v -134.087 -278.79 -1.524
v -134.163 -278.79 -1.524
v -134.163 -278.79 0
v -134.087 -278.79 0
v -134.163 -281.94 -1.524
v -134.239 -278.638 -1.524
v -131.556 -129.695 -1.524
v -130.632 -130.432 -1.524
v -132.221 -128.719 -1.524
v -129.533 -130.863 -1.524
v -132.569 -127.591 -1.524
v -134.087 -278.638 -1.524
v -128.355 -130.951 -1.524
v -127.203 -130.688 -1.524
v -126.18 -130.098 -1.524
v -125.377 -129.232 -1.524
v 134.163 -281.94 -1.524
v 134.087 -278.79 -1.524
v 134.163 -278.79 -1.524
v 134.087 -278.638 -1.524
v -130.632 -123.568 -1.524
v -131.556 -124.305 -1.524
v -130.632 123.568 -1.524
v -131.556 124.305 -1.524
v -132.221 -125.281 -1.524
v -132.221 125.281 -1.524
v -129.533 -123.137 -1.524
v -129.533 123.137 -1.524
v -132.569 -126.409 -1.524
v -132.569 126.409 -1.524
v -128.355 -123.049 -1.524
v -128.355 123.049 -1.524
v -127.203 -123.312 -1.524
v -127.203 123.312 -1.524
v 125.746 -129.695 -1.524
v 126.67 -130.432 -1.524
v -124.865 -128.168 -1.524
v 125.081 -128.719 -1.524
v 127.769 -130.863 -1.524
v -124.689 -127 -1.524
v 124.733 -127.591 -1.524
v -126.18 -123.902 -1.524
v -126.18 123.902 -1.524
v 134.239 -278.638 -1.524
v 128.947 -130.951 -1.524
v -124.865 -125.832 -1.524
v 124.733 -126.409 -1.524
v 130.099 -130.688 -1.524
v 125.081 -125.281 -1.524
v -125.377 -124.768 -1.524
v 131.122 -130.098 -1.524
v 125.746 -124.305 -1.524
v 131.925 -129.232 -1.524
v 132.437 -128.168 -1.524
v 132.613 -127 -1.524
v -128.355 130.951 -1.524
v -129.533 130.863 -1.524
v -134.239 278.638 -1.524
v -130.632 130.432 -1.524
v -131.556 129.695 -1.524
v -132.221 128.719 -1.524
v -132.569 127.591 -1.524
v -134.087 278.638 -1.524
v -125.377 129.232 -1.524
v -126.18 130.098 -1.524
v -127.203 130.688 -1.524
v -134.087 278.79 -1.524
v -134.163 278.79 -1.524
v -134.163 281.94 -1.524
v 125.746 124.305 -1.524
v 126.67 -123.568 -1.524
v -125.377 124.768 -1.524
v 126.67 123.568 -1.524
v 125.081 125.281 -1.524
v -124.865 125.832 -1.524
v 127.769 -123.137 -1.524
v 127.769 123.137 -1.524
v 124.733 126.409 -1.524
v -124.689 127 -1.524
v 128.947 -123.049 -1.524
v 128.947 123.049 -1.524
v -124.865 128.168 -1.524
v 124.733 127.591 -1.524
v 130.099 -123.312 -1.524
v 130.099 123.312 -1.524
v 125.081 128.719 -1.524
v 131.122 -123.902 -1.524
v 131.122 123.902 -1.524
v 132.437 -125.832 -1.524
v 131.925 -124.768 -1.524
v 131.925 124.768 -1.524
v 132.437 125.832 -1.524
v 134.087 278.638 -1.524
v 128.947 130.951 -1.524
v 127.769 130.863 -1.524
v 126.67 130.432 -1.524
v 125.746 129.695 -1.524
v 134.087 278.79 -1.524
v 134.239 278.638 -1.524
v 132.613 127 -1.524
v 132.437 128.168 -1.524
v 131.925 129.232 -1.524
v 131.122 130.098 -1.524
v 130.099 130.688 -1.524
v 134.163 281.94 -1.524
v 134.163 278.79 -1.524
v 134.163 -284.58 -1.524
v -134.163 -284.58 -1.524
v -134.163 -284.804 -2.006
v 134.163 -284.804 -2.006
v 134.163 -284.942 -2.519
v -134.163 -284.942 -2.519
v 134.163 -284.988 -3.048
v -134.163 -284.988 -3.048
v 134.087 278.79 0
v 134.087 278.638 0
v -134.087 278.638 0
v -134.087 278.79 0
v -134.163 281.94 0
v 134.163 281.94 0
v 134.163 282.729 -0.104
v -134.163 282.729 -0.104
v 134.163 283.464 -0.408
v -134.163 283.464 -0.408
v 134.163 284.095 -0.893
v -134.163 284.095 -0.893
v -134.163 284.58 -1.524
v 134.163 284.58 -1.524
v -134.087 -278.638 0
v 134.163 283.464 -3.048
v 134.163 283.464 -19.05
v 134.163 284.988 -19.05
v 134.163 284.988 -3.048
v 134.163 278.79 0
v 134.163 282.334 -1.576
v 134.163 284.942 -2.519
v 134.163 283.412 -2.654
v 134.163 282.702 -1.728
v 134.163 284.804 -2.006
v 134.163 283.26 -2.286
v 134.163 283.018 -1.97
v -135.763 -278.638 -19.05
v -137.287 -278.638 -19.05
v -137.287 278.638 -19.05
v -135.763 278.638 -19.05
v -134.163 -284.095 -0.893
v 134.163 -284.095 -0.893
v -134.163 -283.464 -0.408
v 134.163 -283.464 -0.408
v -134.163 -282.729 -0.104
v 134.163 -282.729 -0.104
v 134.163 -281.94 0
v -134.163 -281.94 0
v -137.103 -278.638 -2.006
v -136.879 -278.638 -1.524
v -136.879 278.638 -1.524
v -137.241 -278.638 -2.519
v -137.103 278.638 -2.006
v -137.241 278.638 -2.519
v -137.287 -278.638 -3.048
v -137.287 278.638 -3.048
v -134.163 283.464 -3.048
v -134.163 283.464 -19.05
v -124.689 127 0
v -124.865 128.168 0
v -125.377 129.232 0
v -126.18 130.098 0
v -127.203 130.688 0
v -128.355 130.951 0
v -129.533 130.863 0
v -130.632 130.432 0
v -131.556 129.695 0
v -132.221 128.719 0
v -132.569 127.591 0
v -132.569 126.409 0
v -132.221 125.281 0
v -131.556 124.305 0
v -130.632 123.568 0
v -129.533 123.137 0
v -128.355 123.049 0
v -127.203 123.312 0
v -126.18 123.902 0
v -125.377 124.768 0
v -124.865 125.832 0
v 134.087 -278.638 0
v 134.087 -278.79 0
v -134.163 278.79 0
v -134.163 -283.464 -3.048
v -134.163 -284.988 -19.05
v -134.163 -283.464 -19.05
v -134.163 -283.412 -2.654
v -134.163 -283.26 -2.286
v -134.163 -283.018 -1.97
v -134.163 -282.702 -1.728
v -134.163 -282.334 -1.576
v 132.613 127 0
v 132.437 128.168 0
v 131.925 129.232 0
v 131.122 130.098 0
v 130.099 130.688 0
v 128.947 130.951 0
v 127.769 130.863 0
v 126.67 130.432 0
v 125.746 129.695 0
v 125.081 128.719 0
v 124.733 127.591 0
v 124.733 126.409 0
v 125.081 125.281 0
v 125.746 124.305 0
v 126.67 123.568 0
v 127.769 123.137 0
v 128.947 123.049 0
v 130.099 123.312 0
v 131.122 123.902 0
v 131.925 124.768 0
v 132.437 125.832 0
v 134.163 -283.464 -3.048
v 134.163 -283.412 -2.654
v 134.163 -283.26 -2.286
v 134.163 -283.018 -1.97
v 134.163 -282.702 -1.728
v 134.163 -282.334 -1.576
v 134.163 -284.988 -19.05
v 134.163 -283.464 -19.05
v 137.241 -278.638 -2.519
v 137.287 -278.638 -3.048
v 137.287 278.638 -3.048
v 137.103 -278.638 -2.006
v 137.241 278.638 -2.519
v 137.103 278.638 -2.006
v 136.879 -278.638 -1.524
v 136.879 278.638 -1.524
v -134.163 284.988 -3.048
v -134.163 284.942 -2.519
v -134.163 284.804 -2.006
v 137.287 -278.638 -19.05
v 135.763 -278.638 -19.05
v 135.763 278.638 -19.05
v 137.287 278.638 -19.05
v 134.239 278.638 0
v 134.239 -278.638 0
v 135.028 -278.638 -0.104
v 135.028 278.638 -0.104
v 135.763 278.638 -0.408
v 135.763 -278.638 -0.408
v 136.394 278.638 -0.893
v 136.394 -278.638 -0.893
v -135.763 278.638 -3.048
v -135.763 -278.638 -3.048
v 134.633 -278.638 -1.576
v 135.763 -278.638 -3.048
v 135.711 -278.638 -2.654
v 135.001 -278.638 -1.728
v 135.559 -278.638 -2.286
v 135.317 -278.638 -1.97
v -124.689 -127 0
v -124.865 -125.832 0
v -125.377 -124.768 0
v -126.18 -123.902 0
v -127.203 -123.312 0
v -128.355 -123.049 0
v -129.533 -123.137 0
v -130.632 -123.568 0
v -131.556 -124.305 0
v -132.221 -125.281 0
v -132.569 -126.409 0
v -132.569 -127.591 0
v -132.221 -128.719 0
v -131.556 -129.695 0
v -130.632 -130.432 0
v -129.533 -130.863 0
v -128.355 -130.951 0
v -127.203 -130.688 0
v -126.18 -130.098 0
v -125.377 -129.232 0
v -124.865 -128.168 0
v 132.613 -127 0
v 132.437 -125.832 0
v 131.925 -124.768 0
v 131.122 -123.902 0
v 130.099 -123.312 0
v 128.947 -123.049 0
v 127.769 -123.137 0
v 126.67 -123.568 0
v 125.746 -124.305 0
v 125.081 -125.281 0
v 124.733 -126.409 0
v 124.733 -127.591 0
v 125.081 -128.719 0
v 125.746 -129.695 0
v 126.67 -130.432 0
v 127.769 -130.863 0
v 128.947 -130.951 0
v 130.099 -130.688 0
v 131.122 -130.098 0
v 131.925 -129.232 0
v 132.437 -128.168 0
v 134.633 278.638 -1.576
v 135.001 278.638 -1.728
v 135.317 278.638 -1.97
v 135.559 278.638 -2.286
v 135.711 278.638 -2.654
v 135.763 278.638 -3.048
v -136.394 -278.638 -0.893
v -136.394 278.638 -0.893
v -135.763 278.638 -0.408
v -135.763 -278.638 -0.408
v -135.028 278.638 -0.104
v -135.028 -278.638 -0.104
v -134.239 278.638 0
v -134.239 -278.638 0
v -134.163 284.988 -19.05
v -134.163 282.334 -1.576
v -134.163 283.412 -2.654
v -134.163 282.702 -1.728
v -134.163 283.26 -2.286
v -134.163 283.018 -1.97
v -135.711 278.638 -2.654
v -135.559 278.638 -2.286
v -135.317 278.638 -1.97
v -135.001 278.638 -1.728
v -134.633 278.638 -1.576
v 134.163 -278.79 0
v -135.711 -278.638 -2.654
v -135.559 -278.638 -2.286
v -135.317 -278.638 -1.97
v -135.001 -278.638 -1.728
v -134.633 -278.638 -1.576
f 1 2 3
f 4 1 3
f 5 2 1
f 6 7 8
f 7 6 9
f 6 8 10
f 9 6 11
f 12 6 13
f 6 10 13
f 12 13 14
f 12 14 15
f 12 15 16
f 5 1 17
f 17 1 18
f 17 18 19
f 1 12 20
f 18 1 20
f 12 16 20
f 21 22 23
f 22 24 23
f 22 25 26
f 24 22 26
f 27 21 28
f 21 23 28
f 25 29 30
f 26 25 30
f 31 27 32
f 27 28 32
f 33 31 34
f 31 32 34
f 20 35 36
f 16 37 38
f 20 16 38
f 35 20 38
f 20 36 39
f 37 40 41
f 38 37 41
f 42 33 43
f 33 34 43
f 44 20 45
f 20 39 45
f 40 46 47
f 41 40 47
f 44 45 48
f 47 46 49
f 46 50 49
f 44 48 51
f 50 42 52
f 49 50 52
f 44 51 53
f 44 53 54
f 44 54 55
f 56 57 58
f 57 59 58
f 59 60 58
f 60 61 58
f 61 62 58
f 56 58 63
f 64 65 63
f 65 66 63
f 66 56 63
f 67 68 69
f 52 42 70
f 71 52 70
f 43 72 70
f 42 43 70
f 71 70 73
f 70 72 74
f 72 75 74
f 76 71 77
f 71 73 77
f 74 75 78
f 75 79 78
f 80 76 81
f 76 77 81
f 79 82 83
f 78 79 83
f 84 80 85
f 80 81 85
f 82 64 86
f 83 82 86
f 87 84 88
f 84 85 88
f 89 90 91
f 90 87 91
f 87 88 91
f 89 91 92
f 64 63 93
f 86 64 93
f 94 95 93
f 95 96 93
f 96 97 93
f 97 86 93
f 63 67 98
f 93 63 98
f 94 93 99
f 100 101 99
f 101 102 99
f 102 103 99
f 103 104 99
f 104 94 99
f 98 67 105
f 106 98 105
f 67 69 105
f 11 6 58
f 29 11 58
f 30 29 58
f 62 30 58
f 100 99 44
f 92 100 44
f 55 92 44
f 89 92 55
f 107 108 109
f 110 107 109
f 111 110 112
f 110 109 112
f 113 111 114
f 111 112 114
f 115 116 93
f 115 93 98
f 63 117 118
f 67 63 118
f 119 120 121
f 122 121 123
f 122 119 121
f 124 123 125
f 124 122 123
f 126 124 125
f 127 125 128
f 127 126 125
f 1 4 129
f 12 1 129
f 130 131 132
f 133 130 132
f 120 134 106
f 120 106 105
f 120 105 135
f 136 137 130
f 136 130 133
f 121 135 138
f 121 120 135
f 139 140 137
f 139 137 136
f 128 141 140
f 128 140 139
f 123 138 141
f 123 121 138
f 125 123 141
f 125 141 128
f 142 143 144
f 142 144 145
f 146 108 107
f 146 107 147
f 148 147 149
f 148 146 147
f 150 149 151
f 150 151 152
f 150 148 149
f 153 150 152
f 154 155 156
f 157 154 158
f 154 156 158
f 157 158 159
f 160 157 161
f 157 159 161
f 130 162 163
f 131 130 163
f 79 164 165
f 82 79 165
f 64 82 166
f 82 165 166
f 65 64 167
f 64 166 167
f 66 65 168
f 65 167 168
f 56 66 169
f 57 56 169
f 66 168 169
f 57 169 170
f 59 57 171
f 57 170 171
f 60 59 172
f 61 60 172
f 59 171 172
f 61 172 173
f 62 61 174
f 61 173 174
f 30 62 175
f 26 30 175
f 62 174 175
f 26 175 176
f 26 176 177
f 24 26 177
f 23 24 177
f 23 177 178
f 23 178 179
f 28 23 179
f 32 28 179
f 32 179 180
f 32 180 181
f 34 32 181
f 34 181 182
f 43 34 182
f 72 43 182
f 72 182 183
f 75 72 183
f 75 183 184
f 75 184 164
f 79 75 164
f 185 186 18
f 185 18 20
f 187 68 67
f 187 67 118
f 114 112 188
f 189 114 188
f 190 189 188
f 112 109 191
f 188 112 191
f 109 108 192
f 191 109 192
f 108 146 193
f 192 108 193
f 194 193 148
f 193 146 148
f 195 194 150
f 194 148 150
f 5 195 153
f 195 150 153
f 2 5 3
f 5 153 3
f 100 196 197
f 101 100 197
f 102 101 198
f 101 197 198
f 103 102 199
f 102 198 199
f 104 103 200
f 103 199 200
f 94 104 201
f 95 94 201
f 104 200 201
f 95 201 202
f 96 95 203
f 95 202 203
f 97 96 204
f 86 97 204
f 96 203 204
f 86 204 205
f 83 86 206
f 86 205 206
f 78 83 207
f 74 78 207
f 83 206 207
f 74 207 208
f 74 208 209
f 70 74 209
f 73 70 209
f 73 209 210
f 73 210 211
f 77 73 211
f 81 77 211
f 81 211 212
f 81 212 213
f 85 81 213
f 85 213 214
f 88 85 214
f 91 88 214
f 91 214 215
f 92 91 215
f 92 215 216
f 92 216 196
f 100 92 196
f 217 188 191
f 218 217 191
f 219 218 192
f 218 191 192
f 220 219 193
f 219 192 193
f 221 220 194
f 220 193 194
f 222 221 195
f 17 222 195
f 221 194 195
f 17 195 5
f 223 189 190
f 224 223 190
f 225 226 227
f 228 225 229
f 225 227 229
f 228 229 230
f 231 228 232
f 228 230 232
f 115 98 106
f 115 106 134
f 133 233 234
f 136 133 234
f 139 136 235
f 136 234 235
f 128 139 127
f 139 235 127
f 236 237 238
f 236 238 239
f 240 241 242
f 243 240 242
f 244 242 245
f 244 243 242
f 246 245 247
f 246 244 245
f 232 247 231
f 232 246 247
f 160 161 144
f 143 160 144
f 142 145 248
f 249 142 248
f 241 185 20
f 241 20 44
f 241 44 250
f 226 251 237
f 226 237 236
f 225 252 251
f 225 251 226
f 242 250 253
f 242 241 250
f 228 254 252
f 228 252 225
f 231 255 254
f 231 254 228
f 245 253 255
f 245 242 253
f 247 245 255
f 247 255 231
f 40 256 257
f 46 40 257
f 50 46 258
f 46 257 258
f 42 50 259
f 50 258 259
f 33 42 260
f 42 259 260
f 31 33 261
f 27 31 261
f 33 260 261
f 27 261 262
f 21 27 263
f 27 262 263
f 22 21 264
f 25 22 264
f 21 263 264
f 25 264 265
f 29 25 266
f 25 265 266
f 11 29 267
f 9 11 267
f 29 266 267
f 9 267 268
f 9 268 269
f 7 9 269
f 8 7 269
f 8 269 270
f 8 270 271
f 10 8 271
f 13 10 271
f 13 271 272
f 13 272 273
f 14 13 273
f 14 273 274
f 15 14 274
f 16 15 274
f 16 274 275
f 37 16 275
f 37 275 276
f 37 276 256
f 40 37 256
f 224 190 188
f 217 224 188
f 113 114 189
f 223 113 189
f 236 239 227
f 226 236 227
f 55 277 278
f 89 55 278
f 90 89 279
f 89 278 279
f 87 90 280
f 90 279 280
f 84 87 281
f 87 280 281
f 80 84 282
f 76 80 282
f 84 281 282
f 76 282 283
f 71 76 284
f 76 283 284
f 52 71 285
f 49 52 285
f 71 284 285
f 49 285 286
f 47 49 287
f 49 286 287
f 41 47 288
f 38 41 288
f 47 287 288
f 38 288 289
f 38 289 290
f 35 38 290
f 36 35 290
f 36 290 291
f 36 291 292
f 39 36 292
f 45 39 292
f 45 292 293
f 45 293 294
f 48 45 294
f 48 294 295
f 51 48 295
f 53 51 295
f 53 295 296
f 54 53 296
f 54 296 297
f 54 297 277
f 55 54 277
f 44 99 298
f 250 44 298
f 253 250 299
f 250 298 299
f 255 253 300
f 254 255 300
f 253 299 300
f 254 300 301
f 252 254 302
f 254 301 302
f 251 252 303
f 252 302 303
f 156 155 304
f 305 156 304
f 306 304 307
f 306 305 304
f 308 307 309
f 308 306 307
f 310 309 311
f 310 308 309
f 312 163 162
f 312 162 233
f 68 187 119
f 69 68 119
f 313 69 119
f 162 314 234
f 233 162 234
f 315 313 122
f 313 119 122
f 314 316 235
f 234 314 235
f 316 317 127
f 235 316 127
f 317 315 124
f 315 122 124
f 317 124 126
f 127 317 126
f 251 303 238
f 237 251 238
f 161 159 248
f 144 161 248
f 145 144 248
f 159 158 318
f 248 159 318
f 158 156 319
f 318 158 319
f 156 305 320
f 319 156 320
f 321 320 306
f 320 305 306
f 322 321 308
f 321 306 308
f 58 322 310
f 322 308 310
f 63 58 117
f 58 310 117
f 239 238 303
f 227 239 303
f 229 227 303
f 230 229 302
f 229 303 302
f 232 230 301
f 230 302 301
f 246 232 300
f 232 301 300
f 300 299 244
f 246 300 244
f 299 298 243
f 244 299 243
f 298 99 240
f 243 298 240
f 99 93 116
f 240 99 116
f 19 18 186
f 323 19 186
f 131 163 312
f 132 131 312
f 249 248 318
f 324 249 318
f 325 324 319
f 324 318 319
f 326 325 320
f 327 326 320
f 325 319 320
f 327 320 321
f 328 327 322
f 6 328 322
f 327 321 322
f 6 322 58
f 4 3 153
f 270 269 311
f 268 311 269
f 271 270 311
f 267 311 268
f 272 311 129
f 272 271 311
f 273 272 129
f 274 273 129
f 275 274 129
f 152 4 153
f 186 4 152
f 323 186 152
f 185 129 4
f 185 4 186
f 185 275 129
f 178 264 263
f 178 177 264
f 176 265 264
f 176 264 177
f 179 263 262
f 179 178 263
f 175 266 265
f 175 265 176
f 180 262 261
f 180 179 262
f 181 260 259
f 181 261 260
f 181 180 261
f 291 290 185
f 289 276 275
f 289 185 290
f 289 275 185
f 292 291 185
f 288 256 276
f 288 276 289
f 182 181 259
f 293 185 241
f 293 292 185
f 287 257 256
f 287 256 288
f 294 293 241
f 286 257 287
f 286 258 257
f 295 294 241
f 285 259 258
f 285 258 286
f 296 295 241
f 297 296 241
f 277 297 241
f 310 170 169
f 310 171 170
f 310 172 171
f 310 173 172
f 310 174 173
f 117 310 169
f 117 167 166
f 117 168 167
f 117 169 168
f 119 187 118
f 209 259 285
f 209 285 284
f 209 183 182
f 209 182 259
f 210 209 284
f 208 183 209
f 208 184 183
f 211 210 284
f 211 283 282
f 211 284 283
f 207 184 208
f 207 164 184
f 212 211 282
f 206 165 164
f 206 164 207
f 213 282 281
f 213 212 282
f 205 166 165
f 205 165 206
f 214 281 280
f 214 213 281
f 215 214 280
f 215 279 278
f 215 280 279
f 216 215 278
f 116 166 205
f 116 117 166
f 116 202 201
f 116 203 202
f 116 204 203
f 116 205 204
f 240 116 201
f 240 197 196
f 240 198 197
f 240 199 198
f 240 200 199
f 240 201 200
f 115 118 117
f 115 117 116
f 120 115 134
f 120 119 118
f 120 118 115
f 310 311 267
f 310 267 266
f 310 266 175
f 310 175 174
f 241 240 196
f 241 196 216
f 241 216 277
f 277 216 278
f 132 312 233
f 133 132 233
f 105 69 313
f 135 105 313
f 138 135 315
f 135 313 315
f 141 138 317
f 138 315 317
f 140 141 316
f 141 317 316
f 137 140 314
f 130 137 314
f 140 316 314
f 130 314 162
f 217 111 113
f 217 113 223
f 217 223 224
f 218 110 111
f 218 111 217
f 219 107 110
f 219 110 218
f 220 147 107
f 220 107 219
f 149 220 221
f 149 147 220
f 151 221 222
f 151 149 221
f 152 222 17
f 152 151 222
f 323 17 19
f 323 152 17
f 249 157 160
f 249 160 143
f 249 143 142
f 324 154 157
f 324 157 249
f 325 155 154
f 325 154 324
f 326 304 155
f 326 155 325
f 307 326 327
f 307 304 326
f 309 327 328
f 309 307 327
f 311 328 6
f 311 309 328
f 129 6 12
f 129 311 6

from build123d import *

# Parameters (mm, degrees)
CROQUIS1_W                   = 274.574
CROQUIS1_H                   = 569.976
BRIDA_BASE1_DEPTH            = 1.524
CROQUIS6_W                   = 3.1242
CROQUIS6_H                   = 6.35
CORTAR_EXTRUIR1_DEPTH        = 317.335586188
BRIDA_START                  = -134.1628
BRIDA_DE_ARISTA1_DEPTH       = 268.3256
BRIDA_START_2                = 6.35
BRIDA_DE_ARISTA1_2_DEPTH     = 557.276
BRIDA_DE_ARISTA1_3_DEPTH     = 268.3256
BRIDA_DE_ARISTA1_4_OUTLINE_W = 0.1524
BRIDA_DE_ARISTA1_4_OUTLINE_H = 1.524
BRIDA_DE_ARISTA1_4_DEPTH     = 0.0762
BRIDA_START_3                = 134.0866
BRIDA_DE_ARISTA1_5_OUTLINE_W = 0.1524
BRIDA_DE_ARISTA1_5_OUTLINE_H = 1.524
BRIDA_DE_ARISTA1_5_DEPTH     = 0.0762
BRIDA_DE_ARISTA1_6_DEPTH     = 557.276
CROQUIS19_R                  = 3.9624
CORTAR_EXTRUIR2_DEPTH        = 317.905006292


# Read off the part's stored shape, not the designer's step: Brida de arista1
# Sheet-metal steps are written as plain solids
with BuildPart() as part:
    # Croquis1 → Brida base1 (new body)
    with BuildSketch(Plane.XY):
        Rectangle(CROQUIS1_W, CROQUIS1_H)
    extrude(amount=-BRIDA_BASE1_DEPTH)

    # Croquis6 → Cortar-Extruir1 (cut, through all)
    with BuildSketch(Plane.XY):
        with Locations((135.7249, 281.813)):
            Rectangle(CROQUIS6_W, CROQUIS6_H)
        with Locations((-135.7249, 281.813)):
            Rectangle(CROQUIS6_W, CROQUIS6_H)
        with Locations((-135.7249, -281.813)):
            Rectangle(CROQUIS6_W, CROQUIS6_H)
        with Locations((135.7249, -281.813)):
            Rectangle(CROQUIS6_W, CROQUIS6_H)
    extrude(amount=-CORTAR_EXTRUIR1_DEPTH, mode=Mode.SUBTRACT)

    # Brida de arista1 outline → Brida de arista1 (add)
    with BuildSketch(Plane.YZ.offset(BRIDA_START)):
        with BuildLine():
            Line((284.988, -19.05), (284.988, -3.048))
            ThreePointArc((284.988, -3.048), (284.884141918, -2.259119551), (284.579645431, -1.524))
            Line((284.579645431, -1.524), (281.94, -1.524))
            ThreePointArc((281.94, -1.524), (283.017630735, -1.970369265), (283.464, -3.048))
            Line((283.464, -3.048), (283.464, -19.05))
            Line((283.464, -19.05), (284.988, -19.05))
        make_face()
        with BuildLine():
            ThreePointArc((-283.464, -3.048), (-283.017630735, -1.970369265), (-281.94, -1.524))
            Line((-281.94, -1.524), (-284.579645431, -1.524))
            ThreePointArc((-284.579645431, -1.524), (-284.884141918, -2.259119551), (-284.988, -3.048))
            Line((-284.988, -3.048), (-284.988, -19.05))
            Line((-284.988, -19.05), (-283.464, -19.05))
            Line((-283.464, -19.05), (-283.464, -3.048))
        make_face()
    extrude(amount=BRIDA_DE_ARISTA1_DEPTH)

    # Brida de arista1 2 outline → Brida de arista1 2 (add)
    with BuildSketch(Plane(origin=(0, 284.988, -1.524), x_dir=(-1, 0, 0), z_dir=(0, -1, 0)).offset(BRIDA_START_2)):
        with BuildLine():
            Line((-135.763, 1.524), (-135.763, 17.526))
            Line((-135.763, 17.526), (-137.287, 17.526))
            Line((-137.287, 17.526), (-137.287, 1.524))
            ThreePointArc((-137.287, 1.524), (-137.183141918, 0.735119551), (-136.878645431, 0))
            Line((-136.878645431, 0), (-134.239, 0))
            ThreePointArc((-134.239, 0), (-135.316630735, 0.446369265), (-135.763, 1.524))
        make_face()
        with BuildLine():
            ThreePointArc((135.763, 1.524), (135.316630735, 0.446369265), (134.239, 0))
            Line((134.239, 0), (136.878645431, 0))
            ThreePointArc((136.878645431, 0), (137.183141918, 0.735119551), (137.287, 1.524))
            Line((137.287, 1.524), (137.287, 17.526))
            Line((137.287, 17.526), (135.763, 17.526))
            Line((135.763, 17.526), (135.763, 1.524))
        make_face()
    extrude(amount=BRIDA_DE_ARISTA1_2_DEPTH)

    # Brida de arista1 3 outline → Brida de arista1 3 (cut)
    with BuildSketch(Plane.YZ.offset(BRIDA_START)):
        with BuildLine():
            ThreePointArc((281.94, 0), (283.464, -0.408354569), (284.579645431, -1.524))
            Line((284.579645431, -1.524), (284.988, -1.524))
            Line((284.988, -1.524), (284.988, 0))
            Line((284.988, 0), (281.94, 0))
        make_face()
        with BuildLine():
            ThreePointArc((-284.579645431, -1.524), (-283.464, -0.408354569), (-281.94, 0))
            Line((-281.94, 0), (-284.988, 0))
            Line((-284.988, 0), (-284.988, -1.524))
            Line((-284.988, -1.524), (-284.579645431, -1.524))
        make_face()
    extrude(amount=BRIDA_DE_ARISTA1_3_DEPTH, mode=Mode.SUBTRACT)

    # Brida de arista1 4 outline → Brida de arista1 4 (cut)
    with BuildSketch(Plane.YZ.offset(BRIDA_START)):
        with Locations((278.7142, -0.762)):
            Rectangle(BRIDA_DE_ARISTA1_4_OUTLINE_W, BRIDA_DE_ARISTA1_4_OUTLINE_H)
        with Locations((-278.7142, -0.762)):
            Rectangle(BRIDA_DE_ARISTA1_4_OUTLINE_W, BRIDA_DE_ARISTA1_4_OUTLINE_H)
    extrude(amount=BRIDA_DE_ARISTA1_4_DEPTH, mode=Mode.SUBTRACT)

    # Brida de arista1 5 outline → Brida de arista1 5 (cut)
    with BuildSketch(Plane.YZ.offset(BRIDA_START_3)):
        with Locations((278.7142, -0.762)):
            Rectangle(BRIDA_DE_ARISTA1_5_OUTLINE_W, BRIDA_DE_ARISTA1_5_OUTLINE_H)
        with Locations((-278.7142, -0.762)):
            Rectangle(BRIDA_DE_ARISTA1_5_OUTLINE_W, BRIDA_DE_ARISTA1_5_OUTLINE_H)
    extrude(amount=BRIDA_DE_ARISTA1_5_DEPTH, mode=Mode.SUBTRACT)

    # Brida de arista1 6 outline → Brida de arista1 6 (cut)
    with BuildSketch(Plane(origin=(0, 284.988, -1.524), x_dir=(-1, 0, 0), z_dir=(0, -1, 0)).offset(BRIDA_START_2)):
        with BuildLine():
            ThreePointArc((-134.239, -1.524), (-135.763, -1.115645431), (-136.878645431, 0))
            Line((-136.878645431, 0), (-137.287, 0))
            Line((-137.287, 0), (-137.287, -1.524))
            Line((-137.287, -1.524), (-134.239, -1.524))
        make_face()
        with BuildLine():
            Line((137.287, 0), (136.878645431, 0))
            ThreePointArc((136.878645431, 0), (135.763, -1.115645431), (134.239, -1.524))
            Line((134.239, -1.524), (137.287, -1.524))
            Line((137.287, -1.524), (137.287, 0))
        make_face()
    extrude(amount=BRIDA_DE_ARISTA1_6_DEPTH, mode=Mode.SUBTRACT)

    # Croquis19 → Cortar-Extruir2 (cut, through all)
    with BuildSketch(Plane.XY):
        with Locations((-128.651, 127)):
            Circle(CROQUIS19_R)
        with Locations((-128.651, -127)):
            Circle(CROQUIS19_R)
        with Locations((128.651, 127)):
            Circle(CROQUIS19_R)
        with Locations((128.651, -127)):
            Circle(CROQUIS19_R)
    extrude(amount=-CORTAR_EXTRUIR2_DEPTH, mode=Mode.SUBTRACT)


solid = part.part
